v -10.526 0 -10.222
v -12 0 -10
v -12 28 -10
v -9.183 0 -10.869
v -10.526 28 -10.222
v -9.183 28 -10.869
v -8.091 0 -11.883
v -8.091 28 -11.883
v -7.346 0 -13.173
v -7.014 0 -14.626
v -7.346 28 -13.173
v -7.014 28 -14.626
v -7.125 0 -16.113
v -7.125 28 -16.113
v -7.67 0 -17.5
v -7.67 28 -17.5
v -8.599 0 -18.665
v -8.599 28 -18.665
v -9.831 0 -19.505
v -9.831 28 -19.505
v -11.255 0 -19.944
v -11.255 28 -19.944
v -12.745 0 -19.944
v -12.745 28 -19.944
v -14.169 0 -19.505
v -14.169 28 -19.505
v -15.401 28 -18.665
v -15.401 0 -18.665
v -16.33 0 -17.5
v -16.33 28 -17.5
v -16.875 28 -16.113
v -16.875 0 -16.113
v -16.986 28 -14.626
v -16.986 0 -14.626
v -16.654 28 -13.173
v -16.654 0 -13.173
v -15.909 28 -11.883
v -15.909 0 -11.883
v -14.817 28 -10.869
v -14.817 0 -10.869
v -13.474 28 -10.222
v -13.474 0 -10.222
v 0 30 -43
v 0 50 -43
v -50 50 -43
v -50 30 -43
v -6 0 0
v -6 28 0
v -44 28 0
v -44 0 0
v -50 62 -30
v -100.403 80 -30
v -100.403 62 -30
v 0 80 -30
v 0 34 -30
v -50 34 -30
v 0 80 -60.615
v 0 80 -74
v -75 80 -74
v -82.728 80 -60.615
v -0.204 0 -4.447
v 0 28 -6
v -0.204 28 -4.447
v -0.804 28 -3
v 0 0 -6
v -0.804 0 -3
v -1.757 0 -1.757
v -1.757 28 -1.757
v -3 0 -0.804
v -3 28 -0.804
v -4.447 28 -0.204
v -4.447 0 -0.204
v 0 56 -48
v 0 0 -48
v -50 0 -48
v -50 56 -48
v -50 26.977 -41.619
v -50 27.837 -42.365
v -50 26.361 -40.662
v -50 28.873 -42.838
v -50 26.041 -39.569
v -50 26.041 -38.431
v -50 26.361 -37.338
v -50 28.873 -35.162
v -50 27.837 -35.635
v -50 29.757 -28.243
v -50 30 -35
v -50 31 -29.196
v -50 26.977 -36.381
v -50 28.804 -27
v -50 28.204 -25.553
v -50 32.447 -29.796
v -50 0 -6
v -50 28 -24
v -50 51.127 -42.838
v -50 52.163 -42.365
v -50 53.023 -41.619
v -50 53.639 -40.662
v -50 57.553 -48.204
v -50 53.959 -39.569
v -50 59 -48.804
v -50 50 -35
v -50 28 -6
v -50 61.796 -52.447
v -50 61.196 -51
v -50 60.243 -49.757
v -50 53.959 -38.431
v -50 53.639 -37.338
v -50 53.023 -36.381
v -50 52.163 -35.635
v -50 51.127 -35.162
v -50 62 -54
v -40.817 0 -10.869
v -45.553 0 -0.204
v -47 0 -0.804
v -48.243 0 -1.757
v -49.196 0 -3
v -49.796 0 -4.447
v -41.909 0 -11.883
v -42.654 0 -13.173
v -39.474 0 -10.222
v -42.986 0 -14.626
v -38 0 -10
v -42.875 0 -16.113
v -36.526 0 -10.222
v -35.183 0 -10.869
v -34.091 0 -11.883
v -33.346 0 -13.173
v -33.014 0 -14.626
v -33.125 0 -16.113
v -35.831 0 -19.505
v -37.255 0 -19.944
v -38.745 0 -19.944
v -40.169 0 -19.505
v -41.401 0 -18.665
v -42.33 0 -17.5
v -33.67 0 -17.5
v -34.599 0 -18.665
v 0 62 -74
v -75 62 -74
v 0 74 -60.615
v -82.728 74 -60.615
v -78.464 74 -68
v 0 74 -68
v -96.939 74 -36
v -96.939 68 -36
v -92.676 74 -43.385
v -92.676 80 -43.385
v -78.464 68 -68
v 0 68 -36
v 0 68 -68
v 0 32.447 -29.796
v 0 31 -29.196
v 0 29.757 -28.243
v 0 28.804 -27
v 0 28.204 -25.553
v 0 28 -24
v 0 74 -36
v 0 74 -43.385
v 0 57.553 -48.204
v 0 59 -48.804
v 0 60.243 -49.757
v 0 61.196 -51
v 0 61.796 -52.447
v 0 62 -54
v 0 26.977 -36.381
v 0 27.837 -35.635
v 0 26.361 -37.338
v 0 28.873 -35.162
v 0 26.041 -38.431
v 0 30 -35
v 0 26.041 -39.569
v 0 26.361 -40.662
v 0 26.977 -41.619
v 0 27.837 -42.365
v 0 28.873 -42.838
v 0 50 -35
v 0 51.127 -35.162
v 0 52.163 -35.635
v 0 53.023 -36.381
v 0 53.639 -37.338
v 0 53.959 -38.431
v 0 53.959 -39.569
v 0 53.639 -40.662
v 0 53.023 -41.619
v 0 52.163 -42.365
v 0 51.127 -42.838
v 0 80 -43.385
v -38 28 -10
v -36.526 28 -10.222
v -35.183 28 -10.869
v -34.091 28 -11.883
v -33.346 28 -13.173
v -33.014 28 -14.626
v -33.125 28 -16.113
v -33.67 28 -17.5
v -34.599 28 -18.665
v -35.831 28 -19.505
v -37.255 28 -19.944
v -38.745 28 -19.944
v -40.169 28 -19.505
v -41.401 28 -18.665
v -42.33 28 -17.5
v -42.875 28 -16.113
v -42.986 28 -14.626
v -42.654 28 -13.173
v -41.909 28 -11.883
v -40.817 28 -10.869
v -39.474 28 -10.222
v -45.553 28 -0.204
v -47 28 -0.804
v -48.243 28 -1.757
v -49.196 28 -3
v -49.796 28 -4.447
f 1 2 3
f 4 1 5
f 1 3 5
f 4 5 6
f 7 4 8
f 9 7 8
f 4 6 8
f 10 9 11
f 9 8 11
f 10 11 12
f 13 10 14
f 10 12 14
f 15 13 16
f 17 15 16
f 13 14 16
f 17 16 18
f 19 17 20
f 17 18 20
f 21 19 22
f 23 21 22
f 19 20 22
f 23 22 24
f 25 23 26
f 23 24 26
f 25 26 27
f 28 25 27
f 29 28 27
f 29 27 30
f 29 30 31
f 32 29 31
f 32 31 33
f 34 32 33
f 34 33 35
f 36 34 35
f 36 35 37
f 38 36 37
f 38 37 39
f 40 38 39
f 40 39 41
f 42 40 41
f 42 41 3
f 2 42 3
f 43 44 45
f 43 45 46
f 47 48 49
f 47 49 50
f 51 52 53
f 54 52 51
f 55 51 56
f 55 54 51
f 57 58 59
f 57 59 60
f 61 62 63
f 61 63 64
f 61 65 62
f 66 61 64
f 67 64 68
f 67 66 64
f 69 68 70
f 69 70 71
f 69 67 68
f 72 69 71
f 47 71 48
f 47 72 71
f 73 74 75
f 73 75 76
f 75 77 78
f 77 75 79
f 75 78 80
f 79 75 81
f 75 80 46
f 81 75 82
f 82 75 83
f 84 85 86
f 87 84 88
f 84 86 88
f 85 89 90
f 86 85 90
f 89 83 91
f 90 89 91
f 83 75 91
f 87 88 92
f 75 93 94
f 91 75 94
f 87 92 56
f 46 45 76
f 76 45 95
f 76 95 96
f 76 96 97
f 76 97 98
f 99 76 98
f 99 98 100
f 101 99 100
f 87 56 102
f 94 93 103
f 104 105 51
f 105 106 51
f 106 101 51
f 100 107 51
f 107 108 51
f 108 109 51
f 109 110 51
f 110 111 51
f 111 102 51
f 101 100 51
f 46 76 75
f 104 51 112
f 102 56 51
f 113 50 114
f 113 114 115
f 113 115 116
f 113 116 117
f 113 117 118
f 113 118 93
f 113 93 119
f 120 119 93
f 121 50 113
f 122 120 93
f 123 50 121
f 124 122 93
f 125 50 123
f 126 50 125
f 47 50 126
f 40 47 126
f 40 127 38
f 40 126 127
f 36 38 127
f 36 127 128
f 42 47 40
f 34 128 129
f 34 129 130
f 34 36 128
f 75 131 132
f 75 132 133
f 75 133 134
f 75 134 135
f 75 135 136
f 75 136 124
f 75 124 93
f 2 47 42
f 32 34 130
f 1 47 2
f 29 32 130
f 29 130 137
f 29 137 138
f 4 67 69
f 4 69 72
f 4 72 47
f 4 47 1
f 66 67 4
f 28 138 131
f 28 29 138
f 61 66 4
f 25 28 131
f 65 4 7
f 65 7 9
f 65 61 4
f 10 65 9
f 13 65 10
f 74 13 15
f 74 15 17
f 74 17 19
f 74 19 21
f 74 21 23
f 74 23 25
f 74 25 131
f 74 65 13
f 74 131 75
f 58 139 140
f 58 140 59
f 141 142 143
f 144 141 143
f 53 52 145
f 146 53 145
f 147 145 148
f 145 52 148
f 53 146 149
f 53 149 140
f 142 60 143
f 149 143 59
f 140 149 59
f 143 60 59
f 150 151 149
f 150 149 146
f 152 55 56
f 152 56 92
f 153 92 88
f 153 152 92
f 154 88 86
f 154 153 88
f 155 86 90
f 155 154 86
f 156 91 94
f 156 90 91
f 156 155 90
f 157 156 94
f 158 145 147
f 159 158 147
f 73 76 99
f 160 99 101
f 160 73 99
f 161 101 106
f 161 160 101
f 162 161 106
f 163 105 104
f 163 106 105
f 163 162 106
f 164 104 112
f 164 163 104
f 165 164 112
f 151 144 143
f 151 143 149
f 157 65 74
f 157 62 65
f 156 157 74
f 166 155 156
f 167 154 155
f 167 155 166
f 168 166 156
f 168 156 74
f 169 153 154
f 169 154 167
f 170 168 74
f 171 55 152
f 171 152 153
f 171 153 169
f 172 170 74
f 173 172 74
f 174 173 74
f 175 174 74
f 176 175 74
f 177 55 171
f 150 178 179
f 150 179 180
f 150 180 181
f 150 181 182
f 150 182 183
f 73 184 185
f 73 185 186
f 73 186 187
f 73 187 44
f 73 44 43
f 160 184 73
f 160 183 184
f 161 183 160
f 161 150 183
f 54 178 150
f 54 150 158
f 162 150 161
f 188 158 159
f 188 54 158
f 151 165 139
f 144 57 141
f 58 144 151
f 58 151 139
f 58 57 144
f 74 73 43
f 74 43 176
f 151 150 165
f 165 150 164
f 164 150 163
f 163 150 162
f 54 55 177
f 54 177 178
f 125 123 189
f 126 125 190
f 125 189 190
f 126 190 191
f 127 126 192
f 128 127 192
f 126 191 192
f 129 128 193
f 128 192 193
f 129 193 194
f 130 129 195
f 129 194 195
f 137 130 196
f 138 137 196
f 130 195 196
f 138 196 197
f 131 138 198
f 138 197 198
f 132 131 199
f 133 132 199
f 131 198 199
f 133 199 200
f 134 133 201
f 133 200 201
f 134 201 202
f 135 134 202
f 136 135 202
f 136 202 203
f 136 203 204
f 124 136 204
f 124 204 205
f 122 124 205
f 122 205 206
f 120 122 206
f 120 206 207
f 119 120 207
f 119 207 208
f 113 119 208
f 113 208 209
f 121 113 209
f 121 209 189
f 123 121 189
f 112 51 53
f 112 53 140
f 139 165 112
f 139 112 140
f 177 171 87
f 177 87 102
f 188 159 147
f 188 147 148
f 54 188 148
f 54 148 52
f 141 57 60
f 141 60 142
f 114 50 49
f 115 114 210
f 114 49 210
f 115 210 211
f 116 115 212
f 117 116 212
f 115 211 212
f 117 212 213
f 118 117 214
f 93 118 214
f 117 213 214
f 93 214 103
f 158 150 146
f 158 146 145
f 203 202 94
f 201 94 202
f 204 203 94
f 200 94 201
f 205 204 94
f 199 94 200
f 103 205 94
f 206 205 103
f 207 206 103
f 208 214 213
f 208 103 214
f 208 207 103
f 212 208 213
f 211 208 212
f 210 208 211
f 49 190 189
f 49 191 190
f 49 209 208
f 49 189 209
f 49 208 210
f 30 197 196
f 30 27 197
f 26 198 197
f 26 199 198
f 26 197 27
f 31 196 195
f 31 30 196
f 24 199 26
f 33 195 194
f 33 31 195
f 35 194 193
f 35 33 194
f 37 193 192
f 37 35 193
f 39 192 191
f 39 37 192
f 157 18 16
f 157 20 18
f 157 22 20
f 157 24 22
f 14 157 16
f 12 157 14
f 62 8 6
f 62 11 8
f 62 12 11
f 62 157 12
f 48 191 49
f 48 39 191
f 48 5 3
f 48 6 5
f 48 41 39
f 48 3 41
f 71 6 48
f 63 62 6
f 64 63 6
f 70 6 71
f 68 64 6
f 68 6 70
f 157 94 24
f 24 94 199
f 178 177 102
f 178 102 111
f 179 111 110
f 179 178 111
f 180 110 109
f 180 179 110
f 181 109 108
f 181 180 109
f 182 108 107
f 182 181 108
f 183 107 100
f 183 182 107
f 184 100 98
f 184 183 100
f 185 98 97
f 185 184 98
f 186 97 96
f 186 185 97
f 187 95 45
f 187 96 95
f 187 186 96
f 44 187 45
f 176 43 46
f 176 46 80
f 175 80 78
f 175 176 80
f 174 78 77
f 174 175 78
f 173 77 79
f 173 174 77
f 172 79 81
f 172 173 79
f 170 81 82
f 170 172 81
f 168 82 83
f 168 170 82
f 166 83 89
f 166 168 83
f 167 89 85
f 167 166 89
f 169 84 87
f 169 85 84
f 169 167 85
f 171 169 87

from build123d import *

# Parameters (mm, degrees)
BOSS_EXTRUDE1_DEPTH = 110
CUT_EXTRUDE1_DEPTH  = 155.841854807
SKETCH3_W           = 74.760259453
SKETCH3_H           = 62
CUT_EXTRUDE2_DEPTH  = 155.841854807
SKETCH4_R           = 5
CUT_EXTRUDE3_DEPTH  = 136.132694452
FILLET1_R           = 6


with BuildPart() as part:
    # Sketch1 → Boss-Extrude1 (new body)
    with BuildSketch(Plane(origin=(0, 0, 0), x_dir=(0, 0, -1), z_dir=(1, 0, 0))):
        with BuildLine():
            Line((0, 0), (48, 0))
            Line((48, 0), (48, 56))
            ThreePointArc((48, 56), (49.757359313, 60.242640687), (54, 62))
            Line((54, 62), (74, 62))
            Line((74, 62), (74, 80))
            Line((74, 80), (60.615384615, 80))
            Line((60.615384615, 80), (60.615384615, 74))
            Line((60.615384615, 74), (68, 74))
            Line((68, 74), (68, 68))
            Line((68, 68), (36, 68))
            Line((36, 68), (36, 74))
            Line((36, 74), (43.384615385, 74))
            Line((43.384615385, 74), (43.384615385, 80))
            Line((43.384615385, 80), (30, 80))
            Line((30, 80), (30, 34))
            ThreePointArc((30, 34), (28.242640687, 29.757359313), (24, 28))
            Line((24, 28), (0, 28))
            Line((0, 28), (0, 0))
        make_face()
        with BuildLine():
            Line((43, 50), (43, 30))
            ThreePointArc((43, 30), (39, 26), (35, 30))
            Line((35, 30), (35, 50))
            ThreePointArc((35, 50), (39, 54), (43, 50))
        make_face(mode=Mode.SUBTRACT)
    extrude(amount=-BOSS_EXTRUDE1_DEPTH)

    # Sketch2 → Cut-Extrude1 (cut, through all)
    with BuildSketch(Plane(origin=(0, 80, 0), x_dir=(1, 0, 0), z_dir=(0, 1, 0))):
        Polygon((-110, 74), (-110, 13.378221735), (-75, 74), align=None)
    extrude(amount=-CUT_EXTRUDE1_DEPTH, mode=Mode.SUBTRACT)

    # Sketch3 → Cut-Extrude2 (cut, through all)
    with BuildSketch(Plane.XY):
        with Locations((-87.380129727, 31)):
            Rectangle(SKETCH3_W, SKETCH3_H)
    extrude(amount=-CUT_EXTRUDE2_DEPTH, mode=Mode.SUBTRACT)

    # Sketch4 → Cut-Extrude3 (cut, through all)
    with BuildSketch(Plane(origin=(0, 28, 0), x_dir=(1, 0, 0), z_dir=(0, 1, 0))):
        with Locations(Location((-38, 15, 0), (0, 0, 270))):
            Circle(SKETCH4_R)
        with Locations(Location((-12, 15, 0), (0, 0, 270))):
            Circle(SKETCH4_R)
    extrude(amount=-CUT_EXTRUDE3_DEPTH, mode=Mode.SUBTRACT)

    # Fillet1
    fillet1_edges = [part.edges().sort_by_distance(p)[0] for p in [
        (-50, 14, 0),
        (0, 14, 0),
    ]]
    fillet(fillet1_edges, radius=FILLET1_R)


solid = part.part
